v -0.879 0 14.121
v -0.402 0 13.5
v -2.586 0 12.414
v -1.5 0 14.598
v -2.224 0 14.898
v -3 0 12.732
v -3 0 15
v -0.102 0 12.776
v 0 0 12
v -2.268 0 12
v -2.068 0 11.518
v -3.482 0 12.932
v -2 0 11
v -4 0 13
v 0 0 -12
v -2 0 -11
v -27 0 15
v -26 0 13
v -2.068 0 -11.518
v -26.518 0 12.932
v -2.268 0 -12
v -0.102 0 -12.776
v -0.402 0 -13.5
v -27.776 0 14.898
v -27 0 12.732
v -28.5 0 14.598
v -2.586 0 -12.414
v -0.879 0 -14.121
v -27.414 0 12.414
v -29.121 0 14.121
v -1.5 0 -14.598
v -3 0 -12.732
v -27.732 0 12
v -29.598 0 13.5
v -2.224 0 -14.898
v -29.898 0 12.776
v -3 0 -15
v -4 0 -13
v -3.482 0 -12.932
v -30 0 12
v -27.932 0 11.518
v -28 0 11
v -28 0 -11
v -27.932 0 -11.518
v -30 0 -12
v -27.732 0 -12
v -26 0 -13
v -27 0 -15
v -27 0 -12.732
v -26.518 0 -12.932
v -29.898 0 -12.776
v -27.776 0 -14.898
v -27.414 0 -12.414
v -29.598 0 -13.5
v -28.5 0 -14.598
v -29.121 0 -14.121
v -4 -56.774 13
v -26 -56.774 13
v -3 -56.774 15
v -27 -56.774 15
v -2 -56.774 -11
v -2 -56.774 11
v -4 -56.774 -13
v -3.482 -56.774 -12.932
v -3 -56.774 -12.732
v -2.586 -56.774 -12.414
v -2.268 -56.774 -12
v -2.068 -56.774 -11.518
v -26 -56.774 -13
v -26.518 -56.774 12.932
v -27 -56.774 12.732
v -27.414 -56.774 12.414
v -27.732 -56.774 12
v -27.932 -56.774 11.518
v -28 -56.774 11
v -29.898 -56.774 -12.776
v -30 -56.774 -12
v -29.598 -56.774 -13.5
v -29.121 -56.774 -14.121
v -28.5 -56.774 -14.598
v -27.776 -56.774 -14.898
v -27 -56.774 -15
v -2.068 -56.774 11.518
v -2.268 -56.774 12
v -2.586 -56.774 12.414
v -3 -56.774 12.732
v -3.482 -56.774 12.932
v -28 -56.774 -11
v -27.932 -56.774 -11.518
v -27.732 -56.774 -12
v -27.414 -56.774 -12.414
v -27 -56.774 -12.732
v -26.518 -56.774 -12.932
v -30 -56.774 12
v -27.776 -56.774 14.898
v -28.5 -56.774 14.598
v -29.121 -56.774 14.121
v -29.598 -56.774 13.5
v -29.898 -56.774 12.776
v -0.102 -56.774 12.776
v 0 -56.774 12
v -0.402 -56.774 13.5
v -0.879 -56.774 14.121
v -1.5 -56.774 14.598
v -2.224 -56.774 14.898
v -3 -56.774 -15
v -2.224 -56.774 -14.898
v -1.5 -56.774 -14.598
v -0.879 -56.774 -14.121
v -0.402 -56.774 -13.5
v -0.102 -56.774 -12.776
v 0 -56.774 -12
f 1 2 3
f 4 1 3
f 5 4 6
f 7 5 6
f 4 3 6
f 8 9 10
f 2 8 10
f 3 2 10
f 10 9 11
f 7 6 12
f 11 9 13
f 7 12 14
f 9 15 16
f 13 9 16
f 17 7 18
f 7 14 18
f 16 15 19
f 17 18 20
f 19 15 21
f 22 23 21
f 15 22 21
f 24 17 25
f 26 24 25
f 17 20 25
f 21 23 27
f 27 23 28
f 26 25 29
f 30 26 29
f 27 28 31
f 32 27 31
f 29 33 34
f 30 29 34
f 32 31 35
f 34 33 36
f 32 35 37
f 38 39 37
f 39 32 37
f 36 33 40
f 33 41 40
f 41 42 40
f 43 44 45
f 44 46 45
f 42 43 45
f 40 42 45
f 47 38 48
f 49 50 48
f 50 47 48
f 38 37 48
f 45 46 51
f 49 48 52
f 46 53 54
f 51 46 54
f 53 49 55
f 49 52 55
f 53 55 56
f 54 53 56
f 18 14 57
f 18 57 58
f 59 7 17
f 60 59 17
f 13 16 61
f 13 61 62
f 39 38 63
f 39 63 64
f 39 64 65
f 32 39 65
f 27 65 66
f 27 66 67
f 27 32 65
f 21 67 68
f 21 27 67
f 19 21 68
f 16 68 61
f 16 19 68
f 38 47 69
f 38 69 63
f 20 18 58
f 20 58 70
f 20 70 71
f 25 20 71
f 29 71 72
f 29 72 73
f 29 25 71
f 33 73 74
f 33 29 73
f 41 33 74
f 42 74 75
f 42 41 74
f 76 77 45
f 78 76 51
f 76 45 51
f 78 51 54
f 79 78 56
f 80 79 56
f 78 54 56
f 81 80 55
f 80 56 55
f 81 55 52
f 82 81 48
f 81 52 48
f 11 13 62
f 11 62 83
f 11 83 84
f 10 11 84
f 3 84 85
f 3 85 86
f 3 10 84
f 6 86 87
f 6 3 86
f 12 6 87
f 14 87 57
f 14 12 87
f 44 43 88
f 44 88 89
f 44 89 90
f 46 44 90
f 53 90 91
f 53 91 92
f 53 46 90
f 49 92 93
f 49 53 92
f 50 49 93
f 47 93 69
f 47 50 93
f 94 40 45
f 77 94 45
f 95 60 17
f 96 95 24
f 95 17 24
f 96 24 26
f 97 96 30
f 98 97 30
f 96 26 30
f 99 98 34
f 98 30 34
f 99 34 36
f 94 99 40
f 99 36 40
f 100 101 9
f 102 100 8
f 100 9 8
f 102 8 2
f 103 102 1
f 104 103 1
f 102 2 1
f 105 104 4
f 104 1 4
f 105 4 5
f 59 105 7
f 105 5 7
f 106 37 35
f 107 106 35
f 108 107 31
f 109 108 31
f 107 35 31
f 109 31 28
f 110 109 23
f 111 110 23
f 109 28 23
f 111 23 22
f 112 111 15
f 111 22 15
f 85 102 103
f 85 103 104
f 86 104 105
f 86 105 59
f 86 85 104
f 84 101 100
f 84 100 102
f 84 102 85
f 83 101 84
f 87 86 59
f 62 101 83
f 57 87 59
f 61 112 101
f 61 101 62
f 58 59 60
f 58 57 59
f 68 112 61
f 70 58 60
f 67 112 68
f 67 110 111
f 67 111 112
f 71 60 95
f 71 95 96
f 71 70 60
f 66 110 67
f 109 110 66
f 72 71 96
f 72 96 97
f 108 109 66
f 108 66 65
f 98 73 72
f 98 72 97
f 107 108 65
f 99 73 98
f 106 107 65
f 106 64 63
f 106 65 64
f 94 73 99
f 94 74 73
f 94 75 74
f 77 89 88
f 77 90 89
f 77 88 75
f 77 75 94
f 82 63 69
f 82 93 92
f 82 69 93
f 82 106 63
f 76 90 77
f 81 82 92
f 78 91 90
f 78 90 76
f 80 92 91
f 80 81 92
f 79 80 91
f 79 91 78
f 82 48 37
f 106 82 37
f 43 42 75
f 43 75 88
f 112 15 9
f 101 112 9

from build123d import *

# Parameters (mm, degrees)
EXTRUDE_1_DEPTH = 56.773811


with BuildPart() as part:
    # Эскиз1 → Бобышка-Вытянуть1 (new body)
    with BuildSketch(Plane(origin=(0, 0, 0), x_dir=(1, 0, 0), z_dir=(0, 1, 0))):
        with BuildLine():
            Line((-27, 15), (-3, 15))
            ThreePointArc((-3, 15), (-0.878679656, 14.121320344), (0, 12))
            Line((0, 12), (0, -12))
            ThreePointArc((0, -12), (-0.878679656, -14.121320344), (-3, -15))
            Line((-3, -15), (-27, -15))
            ThreePointArc((-27, -15), (-29.121320344, -14.121320344), (-30, -12))
            Line((-30, -12), (-30, 12))
            ThreePointArc((-30, 12), (-29.121320344, 14.121320344), (-27, 15))
        make_face()
        with BuildLine():
            Line((-26, 13), (-4, 13))
            ThreePointArc((-4, 13), (-2.585786438, 12.414213562), (-2, 11))
            Line((-2, 11), (-2, -11))
            ThreePointArc((-2, -11), (-2.585786438, -12.414213562), (-4, -13))
            Line((-4, -13), (-26, -13))
            ThreePointArc((-26, -13), (-27.414213562, -12.414213562), (-28, -11))
            Line((-28, -11), (-28, 11))
            ThreePointArc((-28, 11), (-27.414213562, 12.414213562), (-26, 13))
        make_face(mode=Mode.SUBTRACT)
    extrude(amount=-EXTRUDE_1_DEPTH)


solid = part.part
